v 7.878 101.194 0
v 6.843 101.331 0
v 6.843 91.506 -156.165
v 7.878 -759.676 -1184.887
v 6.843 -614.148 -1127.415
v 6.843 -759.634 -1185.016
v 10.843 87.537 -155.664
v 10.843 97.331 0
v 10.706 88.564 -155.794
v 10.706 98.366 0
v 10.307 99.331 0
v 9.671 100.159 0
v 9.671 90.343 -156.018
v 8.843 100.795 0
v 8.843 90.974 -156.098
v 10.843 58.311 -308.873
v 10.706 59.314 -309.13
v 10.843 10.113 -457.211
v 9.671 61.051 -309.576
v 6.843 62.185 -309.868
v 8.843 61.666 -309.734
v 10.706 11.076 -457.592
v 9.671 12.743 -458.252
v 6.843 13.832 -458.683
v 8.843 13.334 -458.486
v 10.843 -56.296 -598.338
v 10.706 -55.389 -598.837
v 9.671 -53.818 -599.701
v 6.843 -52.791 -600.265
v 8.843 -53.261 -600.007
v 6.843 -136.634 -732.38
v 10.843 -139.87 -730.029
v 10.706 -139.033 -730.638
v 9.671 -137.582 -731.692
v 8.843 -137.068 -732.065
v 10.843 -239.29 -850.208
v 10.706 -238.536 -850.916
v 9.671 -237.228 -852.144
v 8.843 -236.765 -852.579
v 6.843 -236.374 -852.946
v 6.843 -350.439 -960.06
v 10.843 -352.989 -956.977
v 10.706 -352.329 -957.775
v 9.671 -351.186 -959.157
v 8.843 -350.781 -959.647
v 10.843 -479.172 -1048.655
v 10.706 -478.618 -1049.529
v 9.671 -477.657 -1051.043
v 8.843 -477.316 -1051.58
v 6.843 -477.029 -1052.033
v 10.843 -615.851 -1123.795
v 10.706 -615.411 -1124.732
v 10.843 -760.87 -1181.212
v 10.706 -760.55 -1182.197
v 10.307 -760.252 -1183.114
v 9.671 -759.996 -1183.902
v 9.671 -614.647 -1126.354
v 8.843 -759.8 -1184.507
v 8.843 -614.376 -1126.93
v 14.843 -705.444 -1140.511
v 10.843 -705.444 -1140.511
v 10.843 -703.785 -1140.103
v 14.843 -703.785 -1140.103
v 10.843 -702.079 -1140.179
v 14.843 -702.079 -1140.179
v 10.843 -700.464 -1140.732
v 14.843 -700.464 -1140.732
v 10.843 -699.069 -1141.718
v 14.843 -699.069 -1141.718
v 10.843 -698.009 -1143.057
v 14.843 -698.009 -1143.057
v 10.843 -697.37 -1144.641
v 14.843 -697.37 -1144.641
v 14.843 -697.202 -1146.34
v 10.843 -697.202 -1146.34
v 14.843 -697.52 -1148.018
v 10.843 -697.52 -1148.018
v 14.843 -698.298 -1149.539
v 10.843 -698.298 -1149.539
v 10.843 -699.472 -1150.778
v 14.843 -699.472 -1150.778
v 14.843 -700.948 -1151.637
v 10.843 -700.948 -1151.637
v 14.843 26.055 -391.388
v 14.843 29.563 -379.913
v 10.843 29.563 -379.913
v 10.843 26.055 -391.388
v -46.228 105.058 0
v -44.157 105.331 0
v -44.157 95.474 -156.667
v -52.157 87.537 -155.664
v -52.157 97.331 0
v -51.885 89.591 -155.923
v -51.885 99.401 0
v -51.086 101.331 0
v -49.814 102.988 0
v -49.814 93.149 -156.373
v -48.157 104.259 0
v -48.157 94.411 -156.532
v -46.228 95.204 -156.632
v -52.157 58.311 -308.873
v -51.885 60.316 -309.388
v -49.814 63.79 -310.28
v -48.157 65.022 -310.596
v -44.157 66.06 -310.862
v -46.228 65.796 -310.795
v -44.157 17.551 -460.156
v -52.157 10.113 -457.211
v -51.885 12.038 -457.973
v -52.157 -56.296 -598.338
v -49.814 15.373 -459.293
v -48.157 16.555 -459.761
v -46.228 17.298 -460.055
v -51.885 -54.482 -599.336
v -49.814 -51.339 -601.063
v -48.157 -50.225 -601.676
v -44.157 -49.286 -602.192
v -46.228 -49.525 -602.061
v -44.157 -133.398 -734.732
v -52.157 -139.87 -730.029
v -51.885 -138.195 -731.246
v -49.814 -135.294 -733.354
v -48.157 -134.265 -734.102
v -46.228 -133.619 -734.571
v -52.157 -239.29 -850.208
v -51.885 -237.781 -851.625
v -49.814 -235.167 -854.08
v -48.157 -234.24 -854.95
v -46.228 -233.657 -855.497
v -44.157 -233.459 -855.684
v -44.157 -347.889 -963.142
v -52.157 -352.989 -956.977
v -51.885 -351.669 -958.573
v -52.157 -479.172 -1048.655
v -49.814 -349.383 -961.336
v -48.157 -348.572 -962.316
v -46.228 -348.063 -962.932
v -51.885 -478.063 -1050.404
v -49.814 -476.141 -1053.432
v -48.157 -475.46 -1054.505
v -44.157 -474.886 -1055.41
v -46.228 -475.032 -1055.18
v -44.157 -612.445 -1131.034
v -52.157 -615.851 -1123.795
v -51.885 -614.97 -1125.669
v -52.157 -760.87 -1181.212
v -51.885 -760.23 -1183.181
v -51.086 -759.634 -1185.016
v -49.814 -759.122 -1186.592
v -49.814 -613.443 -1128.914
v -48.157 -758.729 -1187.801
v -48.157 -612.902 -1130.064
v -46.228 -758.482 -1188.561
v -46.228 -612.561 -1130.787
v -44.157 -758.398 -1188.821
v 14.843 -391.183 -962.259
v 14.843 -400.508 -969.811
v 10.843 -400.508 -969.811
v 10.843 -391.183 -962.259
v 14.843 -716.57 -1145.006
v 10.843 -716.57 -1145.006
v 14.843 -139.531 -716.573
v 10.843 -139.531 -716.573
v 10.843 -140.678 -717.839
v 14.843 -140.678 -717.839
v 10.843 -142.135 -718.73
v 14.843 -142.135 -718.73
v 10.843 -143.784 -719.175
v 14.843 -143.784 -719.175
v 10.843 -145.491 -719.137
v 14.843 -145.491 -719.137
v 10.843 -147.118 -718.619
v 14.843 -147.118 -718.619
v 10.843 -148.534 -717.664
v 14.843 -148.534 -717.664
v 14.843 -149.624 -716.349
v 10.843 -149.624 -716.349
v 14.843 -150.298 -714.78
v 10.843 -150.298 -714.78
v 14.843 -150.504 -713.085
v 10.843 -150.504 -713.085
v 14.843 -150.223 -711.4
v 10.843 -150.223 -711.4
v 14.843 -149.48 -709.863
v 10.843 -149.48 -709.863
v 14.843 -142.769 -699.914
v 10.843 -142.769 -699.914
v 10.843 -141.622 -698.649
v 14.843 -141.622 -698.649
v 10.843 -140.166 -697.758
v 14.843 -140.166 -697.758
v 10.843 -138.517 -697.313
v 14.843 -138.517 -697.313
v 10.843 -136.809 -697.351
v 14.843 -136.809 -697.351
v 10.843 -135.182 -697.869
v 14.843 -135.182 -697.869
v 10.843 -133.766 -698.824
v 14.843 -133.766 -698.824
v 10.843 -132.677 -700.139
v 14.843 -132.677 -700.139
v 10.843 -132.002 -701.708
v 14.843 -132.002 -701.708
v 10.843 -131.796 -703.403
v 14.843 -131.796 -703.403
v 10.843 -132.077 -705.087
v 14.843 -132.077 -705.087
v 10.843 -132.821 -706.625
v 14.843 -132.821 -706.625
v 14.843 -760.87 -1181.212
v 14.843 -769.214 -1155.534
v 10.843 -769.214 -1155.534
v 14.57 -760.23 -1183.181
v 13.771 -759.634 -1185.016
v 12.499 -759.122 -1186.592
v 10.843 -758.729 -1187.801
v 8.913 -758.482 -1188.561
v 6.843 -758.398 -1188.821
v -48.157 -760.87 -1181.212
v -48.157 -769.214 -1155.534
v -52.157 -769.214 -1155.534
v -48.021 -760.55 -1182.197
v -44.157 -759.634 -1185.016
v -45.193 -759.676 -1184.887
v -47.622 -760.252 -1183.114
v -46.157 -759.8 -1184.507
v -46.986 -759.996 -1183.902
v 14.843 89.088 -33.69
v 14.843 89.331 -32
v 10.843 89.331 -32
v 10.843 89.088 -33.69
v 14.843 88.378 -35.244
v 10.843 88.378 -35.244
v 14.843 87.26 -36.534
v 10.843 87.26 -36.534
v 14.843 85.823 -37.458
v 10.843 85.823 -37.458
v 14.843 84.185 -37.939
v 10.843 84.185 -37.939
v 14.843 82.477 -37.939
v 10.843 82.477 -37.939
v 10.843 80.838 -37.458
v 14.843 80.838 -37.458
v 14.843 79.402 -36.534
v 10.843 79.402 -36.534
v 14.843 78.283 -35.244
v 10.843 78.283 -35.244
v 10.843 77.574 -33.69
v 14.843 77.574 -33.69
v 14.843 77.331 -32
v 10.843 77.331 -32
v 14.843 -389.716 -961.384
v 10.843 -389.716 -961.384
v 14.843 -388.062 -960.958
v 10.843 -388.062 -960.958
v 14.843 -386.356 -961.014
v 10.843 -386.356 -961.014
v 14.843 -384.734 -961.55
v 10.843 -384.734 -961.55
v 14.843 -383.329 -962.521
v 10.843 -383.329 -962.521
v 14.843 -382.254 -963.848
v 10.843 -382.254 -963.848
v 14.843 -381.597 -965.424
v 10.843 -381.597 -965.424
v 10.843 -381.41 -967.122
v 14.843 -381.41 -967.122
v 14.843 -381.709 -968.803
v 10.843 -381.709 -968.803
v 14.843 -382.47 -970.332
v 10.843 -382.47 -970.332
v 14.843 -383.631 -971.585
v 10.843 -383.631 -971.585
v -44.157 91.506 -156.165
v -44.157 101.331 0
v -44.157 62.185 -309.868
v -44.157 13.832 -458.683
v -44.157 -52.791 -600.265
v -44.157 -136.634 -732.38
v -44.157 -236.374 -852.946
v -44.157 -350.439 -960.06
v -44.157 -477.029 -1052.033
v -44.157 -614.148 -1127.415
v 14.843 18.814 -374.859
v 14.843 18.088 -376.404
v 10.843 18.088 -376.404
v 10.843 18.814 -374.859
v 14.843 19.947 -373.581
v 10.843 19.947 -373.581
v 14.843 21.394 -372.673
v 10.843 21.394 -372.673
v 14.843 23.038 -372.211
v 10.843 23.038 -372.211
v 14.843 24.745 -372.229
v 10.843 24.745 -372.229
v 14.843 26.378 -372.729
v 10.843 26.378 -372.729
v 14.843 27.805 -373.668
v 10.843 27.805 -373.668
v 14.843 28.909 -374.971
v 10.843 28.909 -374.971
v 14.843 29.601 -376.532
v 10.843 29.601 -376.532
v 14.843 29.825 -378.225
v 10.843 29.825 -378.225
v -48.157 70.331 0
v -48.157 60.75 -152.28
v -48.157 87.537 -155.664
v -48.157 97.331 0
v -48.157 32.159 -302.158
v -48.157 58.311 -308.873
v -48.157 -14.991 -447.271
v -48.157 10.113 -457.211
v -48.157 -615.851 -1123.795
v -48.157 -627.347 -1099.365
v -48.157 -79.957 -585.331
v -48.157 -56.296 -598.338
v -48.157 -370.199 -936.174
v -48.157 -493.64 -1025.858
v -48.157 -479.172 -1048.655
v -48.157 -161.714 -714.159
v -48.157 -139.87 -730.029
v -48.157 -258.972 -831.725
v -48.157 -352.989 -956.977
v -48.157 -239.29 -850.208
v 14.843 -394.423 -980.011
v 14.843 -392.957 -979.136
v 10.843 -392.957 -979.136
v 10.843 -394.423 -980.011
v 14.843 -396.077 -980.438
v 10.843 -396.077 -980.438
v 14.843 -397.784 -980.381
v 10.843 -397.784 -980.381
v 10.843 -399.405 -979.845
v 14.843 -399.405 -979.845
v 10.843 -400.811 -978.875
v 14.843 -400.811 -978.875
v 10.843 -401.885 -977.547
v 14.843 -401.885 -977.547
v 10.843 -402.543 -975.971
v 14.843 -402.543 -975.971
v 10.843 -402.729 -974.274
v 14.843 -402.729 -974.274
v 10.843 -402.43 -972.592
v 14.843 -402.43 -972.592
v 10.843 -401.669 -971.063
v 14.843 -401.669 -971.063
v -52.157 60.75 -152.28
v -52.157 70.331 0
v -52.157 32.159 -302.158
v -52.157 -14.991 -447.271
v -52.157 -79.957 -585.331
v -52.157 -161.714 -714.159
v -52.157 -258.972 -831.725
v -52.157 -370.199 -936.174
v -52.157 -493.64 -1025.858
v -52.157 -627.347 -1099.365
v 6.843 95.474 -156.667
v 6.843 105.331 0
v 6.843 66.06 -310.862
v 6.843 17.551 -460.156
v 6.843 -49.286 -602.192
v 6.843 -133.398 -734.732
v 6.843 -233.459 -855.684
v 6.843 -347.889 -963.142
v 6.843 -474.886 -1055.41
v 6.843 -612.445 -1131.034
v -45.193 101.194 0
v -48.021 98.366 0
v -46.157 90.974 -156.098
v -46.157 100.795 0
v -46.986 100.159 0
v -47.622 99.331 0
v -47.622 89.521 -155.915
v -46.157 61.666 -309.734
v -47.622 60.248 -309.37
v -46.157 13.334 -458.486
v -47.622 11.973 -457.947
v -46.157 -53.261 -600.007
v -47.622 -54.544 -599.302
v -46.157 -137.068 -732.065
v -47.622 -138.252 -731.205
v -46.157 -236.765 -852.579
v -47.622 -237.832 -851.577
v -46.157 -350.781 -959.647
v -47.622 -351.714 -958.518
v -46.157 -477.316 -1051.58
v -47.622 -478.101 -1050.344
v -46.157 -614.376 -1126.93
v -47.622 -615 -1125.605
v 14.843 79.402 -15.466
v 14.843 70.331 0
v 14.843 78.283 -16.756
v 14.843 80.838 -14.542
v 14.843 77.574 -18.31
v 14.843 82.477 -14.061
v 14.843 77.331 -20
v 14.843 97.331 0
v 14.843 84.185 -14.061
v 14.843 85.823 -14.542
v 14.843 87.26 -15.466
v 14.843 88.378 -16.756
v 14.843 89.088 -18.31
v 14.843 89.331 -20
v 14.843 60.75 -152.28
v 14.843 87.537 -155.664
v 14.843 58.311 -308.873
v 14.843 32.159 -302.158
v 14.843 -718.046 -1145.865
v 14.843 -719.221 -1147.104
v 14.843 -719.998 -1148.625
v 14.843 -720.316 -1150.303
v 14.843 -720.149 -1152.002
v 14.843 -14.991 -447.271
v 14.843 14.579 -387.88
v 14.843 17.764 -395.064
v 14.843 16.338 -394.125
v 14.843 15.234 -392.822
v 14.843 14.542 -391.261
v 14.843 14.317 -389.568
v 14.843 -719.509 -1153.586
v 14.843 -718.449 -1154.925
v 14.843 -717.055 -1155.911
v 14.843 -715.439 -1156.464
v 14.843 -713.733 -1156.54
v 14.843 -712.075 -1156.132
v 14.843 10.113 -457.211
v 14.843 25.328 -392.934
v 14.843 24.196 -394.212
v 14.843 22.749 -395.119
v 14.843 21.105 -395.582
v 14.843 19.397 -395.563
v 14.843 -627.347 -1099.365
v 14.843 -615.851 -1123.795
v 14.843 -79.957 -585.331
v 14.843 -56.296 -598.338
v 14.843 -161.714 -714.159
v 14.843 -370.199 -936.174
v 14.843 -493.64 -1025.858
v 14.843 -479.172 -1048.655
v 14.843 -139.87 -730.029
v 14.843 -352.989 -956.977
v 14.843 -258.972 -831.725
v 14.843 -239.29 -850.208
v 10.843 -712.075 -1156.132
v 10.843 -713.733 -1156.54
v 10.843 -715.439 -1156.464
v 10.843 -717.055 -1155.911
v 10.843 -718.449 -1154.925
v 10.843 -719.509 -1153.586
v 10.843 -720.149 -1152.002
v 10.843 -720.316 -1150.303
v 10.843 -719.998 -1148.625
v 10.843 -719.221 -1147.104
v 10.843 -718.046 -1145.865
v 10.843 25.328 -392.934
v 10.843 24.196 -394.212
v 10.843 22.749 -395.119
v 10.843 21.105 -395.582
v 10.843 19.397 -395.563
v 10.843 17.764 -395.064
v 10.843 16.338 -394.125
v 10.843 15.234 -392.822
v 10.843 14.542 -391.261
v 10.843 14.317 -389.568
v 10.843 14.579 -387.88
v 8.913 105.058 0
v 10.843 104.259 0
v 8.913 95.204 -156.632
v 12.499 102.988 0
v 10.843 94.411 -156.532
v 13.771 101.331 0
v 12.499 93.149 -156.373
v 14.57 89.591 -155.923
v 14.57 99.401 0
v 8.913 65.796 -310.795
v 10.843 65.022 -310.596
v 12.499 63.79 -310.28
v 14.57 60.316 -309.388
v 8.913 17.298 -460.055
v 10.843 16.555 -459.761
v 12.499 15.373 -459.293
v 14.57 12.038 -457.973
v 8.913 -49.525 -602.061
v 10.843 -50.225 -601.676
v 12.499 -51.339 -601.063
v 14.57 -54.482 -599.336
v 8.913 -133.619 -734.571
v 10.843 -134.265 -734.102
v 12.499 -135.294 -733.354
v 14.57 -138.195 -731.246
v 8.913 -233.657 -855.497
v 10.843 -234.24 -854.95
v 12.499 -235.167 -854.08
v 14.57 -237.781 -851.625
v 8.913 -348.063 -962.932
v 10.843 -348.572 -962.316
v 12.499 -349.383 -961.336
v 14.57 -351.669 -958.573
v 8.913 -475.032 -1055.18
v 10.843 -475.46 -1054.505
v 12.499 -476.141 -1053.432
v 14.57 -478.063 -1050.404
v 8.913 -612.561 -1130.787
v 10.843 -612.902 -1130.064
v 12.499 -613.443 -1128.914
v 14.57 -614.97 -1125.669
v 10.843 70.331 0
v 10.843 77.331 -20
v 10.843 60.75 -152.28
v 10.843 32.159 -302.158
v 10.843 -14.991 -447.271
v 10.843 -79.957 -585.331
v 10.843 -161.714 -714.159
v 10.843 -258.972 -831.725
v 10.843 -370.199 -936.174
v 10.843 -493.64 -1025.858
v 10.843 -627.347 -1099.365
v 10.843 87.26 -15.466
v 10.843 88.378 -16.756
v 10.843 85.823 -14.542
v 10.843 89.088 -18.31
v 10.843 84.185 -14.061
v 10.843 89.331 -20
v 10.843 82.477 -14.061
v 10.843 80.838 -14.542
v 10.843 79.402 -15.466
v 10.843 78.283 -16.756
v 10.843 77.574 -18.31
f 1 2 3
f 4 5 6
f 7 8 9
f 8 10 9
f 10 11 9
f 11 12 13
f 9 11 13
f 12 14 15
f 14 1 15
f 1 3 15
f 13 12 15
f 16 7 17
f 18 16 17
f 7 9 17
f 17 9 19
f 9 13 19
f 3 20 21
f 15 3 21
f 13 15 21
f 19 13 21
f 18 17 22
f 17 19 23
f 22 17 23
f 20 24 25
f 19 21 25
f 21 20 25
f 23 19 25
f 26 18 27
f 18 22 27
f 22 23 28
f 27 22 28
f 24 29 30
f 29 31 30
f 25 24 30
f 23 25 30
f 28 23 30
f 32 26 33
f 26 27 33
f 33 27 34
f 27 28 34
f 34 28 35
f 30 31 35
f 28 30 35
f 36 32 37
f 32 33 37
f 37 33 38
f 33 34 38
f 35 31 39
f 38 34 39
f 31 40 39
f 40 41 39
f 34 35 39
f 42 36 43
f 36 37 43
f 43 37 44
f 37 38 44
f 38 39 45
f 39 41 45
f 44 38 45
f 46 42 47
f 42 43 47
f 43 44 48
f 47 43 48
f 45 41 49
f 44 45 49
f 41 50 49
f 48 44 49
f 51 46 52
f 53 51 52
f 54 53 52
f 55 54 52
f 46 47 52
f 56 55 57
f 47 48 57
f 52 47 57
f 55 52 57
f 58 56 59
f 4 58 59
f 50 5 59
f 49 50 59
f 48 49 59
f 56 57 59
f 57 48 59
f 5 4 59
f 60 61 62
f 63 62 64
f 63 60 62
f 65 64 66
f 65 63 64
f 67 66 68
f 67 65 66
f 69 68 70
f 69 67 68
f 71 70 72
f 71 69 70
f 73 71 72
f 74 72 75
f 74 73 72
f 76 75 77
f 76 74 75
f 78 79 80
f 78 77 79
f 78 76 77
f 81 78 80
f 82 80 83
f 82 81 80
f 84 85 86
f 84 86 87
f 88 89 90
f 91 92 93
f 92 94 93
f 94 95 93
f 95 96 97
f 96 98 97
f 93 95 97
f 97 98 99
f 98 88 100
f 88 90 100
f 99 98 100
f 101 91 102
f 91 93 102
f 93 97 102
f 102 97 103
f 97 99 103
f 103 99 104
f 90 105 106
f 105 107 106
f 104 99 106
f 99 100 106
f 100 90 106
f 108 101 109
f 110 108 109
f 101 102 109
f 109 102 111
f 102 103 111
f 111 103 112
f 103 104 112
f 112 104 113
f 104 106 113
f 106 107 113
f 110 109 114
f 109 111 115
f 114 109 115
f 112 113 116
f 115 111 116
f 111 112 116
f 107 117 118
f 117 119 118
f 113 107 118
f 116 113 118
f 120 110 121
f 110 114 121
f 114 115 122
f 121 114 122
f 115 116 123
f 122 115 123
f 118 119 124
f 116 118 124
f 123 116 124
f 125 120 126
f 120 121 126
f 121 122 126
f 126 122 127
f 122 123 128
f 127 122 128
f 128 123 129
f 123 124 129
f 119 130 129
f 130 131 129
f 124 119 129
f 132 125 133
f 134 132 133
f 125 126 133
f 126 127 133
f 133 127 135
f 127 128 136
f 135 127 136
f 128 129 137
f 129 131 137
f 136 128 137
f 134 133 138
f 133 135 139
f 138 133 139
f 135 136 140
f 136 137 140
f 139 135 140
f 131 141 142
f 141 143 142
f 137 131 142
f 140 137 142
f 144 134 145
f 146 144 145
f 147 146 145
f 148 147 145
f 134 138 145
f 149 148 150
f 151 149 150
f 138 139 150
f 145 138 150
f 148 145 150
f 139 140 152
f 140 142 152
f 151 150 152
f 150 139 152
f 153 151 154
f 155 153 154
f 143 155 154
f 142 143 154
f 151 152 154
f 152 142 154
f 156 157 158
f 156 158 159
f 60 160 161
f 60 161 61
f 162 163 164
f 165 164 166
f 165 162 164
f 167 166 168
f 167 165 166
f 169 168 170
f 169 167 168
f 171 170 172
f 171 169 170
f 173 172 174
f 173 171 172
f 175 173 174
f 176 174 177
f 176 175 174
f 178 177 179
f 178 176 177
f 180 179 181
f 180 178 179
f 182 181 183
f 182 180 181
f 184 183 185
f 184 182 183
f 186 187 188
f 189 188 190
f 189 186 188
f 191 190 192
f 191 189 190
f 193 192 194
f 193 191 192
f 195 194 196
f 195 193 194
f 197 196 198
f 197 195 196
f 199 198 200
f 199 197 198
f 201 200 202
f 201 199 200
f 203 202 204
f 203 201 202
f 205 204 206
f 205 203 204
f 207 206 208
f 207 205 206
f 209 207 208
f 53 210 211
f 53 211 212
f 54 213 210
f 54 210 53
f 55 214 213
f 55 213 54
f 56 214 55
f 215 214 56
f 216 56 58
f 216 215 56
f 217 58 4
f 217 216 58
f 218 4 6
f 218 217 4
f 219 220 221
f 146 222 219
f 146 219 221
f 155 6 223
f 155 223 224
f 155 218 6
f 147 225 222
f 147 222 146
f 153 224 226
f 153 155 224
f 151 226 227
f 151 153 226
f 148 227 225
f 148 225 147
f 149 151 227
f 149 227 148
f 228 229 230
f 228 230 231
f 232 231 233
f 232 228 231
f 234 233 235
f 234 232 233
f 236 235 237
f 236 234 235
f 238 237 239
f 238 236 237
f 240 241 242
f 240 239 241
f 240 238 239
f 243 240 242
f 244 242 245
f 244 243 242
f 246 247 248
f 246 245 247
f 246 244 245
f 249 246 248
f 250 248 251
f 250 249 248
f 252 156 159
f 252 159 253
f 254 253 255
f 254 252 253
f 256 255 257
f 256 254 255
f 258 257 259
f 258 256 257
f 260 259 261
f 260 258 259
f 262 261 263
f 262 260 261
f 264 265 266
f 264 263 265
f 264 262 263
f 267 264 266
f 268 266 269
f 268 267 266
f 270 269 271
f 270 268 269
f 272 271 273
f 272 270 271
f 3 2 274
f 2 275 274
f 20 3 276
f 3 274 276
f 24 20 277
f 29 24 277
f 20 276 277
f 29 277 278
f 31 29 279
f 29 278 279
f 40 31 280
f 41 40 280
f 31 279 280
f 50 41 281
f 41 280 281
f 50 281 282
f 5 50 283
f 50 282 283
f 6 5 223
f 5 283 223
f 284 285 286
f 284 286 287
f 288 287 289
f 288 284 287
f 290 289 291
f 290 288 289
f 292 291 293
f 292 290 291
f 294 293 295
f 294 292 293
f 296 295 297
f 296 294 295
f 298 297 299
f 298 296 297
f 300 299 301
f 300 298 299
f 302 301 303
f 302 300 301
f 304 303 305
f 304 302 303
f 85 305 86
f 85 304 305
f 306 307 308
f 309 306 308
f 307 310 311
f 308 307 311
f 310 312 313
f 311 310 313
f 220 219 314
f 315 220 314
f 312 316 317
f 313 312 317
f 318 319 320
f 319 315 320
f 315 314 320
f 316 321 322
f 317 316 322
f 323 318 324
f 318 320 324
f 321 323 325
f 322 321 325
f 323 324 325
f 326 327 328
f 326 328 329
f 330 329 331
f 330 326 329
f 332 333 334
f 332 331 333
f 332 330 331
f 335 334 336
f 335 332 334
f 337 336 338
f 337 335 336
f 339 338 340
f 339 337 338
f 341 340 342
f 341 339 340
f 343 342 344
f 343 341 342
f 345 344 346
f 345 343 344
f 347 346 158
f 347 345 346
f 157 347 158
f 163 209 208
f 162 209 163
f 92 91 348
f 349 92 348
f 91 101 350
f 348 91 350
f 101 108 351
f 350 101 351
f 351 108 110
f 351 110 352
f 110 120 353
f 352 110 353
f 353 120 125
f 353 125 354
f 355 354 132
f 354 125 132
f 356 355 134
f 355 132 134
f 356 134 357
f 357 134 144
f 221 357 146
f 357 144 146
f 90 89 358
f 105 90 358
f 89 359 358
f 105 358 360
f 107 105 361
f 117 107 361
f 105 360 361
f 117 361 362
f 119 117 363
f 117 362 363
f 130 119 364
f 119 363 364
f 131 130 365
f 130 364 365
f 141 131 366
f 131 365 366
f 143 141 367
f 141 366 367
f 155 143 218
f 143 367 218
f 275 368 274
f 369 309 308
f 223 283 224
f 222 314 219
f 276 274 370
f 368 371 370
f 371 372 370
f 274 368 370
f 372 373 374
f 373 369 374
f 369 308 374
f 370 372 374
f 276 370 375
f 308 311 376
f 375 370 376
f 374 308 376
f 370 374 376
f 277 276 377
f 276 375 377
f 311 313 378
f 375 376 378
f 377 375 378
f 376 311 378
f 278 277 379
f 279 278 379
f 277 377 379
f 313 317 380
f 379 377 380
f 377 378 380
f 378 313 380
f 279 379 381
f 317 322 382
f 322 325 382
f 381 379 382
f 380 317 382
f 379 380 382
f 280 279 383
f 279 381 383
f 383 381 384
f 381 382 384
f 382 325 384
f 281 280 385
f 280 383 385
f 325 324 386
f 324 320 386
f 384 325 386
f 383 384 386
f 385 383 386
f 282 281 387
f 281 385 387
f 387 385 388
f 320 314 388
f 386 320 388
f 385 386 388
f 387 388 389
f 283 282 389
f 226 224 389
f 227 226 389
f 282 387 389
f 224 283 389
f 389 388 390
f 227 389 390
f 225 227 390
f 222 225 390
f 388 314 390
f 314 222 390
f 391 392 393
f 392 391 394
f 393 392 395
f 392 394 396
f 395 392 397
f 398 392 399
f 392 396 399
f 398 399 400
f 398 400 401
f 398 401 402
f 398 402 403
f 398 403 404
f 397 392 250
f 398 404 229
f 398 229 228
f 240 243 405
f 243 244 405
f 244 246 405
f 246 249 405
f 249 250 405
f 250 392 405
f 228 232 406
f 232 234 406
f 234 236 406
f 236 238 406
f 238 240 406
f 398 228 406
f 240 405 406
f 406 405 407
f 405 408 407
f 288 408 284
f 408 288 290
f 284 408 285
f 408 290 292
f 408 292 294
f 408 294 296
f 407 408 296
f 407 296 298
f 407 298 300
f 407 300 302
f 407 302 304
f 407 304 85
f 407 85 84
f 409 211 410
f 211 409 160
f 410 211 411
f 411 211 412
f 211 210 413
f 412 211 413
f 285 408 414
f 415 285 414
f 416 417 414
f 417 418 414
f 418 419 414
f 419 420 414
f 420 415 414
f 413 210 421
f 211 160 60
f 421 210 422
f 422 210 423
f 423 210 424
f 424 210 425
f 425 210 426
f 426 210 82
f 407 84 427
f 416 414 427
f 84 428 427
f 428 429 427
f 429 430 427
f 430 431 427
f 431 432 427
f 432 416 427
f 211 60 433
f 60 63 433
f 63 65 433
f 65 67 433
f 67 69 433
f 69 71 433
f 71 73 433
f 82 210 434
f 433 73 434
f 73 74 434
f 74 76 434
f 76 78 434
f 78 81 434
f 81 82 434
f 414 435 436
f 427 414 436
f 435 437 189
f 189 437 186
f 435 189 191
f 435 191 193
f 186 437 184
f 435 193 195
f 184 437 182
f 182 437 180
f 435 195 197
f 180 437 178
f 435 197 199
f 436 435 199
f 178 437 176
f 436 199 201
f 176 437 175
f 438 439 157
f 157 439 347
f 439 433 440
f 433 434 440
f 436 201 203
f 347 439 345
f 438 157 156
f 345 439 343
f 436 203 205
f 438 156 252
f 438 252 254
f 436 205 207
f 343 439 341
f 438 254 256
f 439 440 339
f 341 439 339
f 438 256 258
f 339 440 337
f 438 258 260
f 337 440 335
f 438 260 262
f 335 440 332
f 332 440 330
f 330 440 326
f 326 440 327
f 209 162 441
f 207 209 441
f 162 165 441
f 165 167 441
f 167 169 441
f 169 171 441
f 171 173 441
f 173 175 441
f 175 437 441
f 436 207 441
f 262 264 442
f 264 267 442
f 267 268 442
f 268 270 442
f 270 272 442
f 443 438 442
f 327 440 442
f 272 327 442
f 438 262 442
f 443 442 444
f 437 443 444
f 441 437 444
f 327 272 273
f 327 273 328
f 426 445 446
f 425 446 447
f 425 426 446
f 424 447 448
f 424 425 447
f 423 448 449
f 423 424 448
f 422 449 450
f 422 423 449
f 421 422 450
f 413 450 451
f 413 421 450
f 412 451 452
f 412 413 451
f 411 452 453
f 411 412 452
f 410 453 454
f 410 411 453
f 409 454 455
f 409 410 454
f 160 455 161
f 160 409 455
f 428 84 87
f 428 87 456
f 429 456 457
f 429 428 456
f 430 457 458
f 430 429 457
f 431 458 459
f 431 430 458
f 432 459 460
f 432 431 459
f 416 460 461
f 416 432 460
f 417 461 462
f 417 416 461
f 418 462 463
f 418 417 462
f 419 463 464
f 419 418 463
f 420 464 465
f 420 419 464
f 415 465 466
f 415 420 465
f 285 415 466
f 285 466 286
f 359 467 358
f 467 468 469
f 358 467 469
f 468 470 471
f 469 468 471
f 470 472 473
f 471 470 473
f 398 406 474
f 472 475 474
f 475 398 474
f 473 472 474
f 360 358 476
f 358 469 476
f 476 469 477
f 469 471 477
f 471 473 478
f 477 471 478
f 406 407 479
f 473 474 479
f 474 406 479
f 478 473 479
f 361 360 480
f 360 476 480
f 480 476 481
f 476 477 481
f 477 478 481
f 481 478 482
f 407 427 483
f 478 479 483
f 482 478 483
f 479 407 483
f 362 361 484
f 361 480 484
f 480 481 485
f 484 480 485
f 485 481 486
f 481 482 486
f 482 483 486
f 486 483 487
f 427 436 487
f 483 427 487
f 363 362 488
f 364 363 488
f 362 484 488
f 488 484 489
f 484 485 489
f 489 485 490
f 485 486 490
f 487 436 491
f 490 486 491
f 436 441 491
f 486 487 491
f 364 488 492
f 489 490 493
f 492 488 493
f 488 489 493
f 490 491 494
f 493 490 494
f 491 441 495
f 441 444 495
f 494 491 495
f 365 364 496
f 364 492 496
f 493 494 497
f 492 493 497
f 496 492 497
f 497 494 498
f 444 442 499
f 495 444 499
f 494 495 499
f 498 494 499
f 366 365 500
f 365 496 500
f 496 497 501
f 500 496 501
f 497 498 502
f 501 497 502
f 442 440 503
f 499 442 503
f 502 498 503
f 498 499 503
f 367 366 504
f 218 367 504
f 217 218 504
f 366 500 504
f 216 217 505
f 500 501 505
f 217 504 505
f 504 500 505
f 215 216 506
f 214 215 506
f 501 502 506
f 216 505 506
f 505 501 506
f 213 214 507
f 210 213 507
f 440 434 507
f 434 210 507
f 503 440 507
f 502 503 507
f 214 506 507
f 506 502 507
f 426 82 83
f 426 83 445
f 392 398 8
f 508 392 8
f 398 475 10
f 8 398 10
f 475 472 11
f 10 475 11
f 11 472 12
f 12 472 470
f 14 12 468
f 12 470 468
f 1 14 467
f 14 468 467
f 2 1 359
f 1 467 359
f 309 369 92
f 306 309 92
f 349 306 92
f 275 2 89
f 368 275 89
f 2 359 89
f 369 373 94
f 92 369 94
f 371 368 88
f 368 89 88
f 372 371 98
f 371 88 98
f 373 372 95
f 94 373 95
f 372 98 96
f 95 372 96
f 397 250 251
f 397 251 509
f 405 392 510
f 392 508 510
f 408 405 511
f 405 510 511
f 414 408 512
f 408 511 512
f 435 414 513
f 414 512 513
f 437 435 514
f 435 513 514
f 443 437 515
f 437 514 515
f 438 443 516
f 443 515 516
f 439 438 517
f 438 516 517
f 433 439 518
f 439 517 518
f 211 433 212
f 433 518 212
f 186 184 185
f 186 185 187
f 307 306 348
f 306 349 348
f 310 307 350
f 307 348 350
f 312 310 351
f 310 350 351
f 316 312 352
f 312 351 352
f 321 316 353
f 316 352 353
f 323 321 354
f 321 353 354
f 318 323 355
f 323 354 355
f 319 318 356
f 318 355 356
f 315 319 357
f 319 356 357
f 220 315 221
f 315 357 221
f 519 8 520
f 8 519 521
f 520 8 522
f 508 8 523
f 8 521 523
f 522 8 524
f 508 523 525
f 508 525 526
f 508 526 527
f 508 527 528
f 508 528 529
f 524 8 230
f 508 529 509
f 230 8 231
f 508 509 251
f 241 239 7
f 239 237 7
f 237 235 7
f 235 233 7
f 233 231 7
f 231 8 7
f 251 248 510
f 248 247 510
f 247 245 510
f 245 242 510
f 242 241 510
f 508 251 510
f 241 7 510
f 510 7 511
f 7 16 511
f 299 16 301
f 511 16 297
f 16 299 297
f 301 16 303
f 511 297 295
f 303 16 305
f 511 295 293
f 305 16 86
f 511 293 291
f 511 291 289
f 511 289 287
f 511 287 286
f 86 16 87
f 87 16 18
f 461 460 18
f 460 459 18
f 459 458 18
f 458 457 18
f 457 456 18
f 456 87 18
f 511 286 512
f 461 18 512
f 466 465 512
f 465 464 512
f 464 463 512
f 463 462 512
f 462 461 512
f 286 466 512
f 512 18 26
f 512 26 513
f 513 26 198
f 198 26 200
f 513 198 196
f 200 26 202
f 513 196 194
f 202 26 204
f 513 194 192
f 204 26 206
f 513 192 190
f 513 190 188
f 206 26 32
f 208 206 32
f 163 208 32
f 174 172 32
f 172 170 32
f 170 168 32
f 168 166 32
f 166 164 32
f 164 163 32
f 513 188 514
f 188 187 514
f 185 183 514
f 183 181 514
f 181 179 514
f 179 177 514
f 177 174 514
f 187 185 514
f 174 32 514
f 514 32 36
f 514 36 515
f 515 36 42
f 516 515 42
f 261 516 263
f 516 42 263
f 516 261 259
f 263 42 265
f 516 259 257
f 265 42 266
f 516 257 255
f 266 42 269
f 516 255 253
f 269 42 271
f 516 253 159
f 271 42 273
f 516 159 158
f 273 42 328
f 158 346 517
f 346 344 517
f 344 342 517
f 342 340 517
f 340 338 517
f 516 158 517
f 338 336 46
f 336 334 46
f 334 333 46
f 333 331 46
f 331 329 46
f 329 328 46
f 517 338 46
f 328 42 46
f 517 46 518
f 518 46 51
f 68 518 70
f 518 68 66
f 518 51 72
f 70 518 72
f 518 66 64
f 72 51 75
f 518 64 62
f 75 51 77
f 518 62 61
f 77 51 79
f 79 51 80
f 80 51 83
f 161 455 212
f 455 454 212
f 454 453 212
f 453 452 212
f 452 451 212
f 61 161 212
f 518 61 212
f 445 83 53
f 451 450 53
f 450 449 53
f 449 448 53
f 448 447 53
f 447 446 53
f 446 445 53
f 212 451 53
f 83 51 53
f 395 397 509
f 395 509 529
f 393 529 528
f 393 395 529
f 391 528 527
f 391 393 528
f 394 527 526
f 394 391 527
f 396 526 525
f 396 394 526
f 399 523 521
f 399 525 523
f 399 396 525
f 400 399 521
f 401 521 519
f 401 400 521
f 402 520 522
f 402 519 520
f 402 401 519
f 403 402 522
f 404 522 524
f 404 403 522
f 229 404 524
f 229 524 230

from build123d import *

# Parameters (mm, degrees)
REVOLVE1_ANGLE     = 72
CUT_EXTRUDE1_DEPTH = 10


with BuildPart() as part:
    # Sketch1 → Revolve1 (revolve)
    with BuildSketch(Plane.XY):
        with BuildLine():
            ThreePointArc((-52.157480315, 97.330708661), (-49.814334564, 102.987562911), (-44.157480315, 105.330708661))
            Line((-44.157480315, 105.330708661), (6.842519685, 105.330708661))
            ThreePointArc((6.842519685, 105.330708661), (12.499373935, 102.987562911), (14.842519685, 97.330708661))
            Line((14.842519685, 97.330708661), (14.842519685, 70.330708661))
            Line((14.842519685, 70.330708661), (10.842519685, 70.330708661))
            Line((10.842519685, 70.330708661), (10.842519685, 97.330708661))
            ThreePointArc((10.842519685, 97.330708661), (9.67094681, 100.159135786), (6.842519685, 101.330708661))
            Line((6.842519685, 101.330708661), (-44.157480315, 101.330708661))
            ThreePointArc((-44.157480315, 101.330708661), (-46.98590744, 100.159135786), (-48.157480315, 97.330708661))
            Line((-48.157480315, 97.330708661), (-48.157480315, 70.330708661))
            Line((-48.157480315, 70.330708661), (-52.157480315, 70.330708661))
            Line((-52.157480315, 70.330708661), (-52.157480315, 97.330708661))
        make_face()
    revolve(axis=Axis((14.842519685, -1144.669291339, 0), (-1, 0, 0)), revolution_arc=REVOLVE1_ANGLE)

    # Sketch2 → Cut-Extrude1 (cut)
    with BuildSketch(Plane(origin=(14.842519685, 0, 0), x_dir=(0, 0, -1), z_dir=(1, 0, 0))):
        with BuildLine():
            Line((20, 89.330708661), (32, 89.330708661))
            ThreePointArc((32, 89.330708661), (38, 83.330708661), (32, 77.330708661))
            Line((32, 77.330708661), (20, 77.330708661))
            ThreePointArc((20, 77.330708661), (14, 83.330708661), (20, 89.330708661))
        make_face()
        with BuildLine():
            Line((379.912778747, 29.563343425), (391.388435819, 26.054882969))
            ThreePointArc((391.388435819, 26.054882969), (395.372034126, 18.562824205), (387.879975362, 14.579225897))
            Line((387.879975362, 14.579225897), (376.40431829, 18.087686354))
            ThreePointArc((376.40431829, 18.087686354), (372.420719983, 25.579745118), (379.912778747, 29.563343425))
        make_face()
        with BuildLine():
            Line((706.624794334, -132.820784875), (716.573245205, -139.531099717))
            ThreePointArc((716.573245205, -139.531099717), (718.192313219, -147.860482573), (709.862930363, -149.479550587))
            Line((709.862930363, -149.479550587), (699.914479492, -142.769235746))
            ThreePointArc((699.914479492, -142.769235746), (698.295411478, -134.43985289), (706.624794334, -132.820784875))
        make_face()
        with BuildLine():
            Line((971.584524259, -383.630848012), (979.136368952, -392.95659955))
            ThreePointArc((979.136368952, -392.95659955), (978.249415529, -401.395397665), (969.810617414, -400.508444242))
            Line((969.810617414, -400.508444242), (962.258772721, -391.182692705))
            ThreePointArc((962.258772721, -391.182692705), (963.145726144, -382.74389459), (971.584524259, -383.630848012))
        make_face()
        with BuildLine():
            Line((1151.637008404, -700.948432155), (1156.132287525, -712.074638409))
            ThreePointArc((1156.132287525, -712.074638409), (1152.816823958, -719.885381097), (1145.00608127, -716.56991753))
            Line((1145.00608127, -716.56991753), (1140.510802149, -705.443711276))
            ThreePointArc((1140.510802149, -705.443711276), (1143.826265716, -697.632968588), (1151.637008404, -700.948432155))
        make_face()
    extrude(amount=-CUT_EXTRUDE1_DEPTH, mode=Mode.SUBTRACT)


solid = part.part
